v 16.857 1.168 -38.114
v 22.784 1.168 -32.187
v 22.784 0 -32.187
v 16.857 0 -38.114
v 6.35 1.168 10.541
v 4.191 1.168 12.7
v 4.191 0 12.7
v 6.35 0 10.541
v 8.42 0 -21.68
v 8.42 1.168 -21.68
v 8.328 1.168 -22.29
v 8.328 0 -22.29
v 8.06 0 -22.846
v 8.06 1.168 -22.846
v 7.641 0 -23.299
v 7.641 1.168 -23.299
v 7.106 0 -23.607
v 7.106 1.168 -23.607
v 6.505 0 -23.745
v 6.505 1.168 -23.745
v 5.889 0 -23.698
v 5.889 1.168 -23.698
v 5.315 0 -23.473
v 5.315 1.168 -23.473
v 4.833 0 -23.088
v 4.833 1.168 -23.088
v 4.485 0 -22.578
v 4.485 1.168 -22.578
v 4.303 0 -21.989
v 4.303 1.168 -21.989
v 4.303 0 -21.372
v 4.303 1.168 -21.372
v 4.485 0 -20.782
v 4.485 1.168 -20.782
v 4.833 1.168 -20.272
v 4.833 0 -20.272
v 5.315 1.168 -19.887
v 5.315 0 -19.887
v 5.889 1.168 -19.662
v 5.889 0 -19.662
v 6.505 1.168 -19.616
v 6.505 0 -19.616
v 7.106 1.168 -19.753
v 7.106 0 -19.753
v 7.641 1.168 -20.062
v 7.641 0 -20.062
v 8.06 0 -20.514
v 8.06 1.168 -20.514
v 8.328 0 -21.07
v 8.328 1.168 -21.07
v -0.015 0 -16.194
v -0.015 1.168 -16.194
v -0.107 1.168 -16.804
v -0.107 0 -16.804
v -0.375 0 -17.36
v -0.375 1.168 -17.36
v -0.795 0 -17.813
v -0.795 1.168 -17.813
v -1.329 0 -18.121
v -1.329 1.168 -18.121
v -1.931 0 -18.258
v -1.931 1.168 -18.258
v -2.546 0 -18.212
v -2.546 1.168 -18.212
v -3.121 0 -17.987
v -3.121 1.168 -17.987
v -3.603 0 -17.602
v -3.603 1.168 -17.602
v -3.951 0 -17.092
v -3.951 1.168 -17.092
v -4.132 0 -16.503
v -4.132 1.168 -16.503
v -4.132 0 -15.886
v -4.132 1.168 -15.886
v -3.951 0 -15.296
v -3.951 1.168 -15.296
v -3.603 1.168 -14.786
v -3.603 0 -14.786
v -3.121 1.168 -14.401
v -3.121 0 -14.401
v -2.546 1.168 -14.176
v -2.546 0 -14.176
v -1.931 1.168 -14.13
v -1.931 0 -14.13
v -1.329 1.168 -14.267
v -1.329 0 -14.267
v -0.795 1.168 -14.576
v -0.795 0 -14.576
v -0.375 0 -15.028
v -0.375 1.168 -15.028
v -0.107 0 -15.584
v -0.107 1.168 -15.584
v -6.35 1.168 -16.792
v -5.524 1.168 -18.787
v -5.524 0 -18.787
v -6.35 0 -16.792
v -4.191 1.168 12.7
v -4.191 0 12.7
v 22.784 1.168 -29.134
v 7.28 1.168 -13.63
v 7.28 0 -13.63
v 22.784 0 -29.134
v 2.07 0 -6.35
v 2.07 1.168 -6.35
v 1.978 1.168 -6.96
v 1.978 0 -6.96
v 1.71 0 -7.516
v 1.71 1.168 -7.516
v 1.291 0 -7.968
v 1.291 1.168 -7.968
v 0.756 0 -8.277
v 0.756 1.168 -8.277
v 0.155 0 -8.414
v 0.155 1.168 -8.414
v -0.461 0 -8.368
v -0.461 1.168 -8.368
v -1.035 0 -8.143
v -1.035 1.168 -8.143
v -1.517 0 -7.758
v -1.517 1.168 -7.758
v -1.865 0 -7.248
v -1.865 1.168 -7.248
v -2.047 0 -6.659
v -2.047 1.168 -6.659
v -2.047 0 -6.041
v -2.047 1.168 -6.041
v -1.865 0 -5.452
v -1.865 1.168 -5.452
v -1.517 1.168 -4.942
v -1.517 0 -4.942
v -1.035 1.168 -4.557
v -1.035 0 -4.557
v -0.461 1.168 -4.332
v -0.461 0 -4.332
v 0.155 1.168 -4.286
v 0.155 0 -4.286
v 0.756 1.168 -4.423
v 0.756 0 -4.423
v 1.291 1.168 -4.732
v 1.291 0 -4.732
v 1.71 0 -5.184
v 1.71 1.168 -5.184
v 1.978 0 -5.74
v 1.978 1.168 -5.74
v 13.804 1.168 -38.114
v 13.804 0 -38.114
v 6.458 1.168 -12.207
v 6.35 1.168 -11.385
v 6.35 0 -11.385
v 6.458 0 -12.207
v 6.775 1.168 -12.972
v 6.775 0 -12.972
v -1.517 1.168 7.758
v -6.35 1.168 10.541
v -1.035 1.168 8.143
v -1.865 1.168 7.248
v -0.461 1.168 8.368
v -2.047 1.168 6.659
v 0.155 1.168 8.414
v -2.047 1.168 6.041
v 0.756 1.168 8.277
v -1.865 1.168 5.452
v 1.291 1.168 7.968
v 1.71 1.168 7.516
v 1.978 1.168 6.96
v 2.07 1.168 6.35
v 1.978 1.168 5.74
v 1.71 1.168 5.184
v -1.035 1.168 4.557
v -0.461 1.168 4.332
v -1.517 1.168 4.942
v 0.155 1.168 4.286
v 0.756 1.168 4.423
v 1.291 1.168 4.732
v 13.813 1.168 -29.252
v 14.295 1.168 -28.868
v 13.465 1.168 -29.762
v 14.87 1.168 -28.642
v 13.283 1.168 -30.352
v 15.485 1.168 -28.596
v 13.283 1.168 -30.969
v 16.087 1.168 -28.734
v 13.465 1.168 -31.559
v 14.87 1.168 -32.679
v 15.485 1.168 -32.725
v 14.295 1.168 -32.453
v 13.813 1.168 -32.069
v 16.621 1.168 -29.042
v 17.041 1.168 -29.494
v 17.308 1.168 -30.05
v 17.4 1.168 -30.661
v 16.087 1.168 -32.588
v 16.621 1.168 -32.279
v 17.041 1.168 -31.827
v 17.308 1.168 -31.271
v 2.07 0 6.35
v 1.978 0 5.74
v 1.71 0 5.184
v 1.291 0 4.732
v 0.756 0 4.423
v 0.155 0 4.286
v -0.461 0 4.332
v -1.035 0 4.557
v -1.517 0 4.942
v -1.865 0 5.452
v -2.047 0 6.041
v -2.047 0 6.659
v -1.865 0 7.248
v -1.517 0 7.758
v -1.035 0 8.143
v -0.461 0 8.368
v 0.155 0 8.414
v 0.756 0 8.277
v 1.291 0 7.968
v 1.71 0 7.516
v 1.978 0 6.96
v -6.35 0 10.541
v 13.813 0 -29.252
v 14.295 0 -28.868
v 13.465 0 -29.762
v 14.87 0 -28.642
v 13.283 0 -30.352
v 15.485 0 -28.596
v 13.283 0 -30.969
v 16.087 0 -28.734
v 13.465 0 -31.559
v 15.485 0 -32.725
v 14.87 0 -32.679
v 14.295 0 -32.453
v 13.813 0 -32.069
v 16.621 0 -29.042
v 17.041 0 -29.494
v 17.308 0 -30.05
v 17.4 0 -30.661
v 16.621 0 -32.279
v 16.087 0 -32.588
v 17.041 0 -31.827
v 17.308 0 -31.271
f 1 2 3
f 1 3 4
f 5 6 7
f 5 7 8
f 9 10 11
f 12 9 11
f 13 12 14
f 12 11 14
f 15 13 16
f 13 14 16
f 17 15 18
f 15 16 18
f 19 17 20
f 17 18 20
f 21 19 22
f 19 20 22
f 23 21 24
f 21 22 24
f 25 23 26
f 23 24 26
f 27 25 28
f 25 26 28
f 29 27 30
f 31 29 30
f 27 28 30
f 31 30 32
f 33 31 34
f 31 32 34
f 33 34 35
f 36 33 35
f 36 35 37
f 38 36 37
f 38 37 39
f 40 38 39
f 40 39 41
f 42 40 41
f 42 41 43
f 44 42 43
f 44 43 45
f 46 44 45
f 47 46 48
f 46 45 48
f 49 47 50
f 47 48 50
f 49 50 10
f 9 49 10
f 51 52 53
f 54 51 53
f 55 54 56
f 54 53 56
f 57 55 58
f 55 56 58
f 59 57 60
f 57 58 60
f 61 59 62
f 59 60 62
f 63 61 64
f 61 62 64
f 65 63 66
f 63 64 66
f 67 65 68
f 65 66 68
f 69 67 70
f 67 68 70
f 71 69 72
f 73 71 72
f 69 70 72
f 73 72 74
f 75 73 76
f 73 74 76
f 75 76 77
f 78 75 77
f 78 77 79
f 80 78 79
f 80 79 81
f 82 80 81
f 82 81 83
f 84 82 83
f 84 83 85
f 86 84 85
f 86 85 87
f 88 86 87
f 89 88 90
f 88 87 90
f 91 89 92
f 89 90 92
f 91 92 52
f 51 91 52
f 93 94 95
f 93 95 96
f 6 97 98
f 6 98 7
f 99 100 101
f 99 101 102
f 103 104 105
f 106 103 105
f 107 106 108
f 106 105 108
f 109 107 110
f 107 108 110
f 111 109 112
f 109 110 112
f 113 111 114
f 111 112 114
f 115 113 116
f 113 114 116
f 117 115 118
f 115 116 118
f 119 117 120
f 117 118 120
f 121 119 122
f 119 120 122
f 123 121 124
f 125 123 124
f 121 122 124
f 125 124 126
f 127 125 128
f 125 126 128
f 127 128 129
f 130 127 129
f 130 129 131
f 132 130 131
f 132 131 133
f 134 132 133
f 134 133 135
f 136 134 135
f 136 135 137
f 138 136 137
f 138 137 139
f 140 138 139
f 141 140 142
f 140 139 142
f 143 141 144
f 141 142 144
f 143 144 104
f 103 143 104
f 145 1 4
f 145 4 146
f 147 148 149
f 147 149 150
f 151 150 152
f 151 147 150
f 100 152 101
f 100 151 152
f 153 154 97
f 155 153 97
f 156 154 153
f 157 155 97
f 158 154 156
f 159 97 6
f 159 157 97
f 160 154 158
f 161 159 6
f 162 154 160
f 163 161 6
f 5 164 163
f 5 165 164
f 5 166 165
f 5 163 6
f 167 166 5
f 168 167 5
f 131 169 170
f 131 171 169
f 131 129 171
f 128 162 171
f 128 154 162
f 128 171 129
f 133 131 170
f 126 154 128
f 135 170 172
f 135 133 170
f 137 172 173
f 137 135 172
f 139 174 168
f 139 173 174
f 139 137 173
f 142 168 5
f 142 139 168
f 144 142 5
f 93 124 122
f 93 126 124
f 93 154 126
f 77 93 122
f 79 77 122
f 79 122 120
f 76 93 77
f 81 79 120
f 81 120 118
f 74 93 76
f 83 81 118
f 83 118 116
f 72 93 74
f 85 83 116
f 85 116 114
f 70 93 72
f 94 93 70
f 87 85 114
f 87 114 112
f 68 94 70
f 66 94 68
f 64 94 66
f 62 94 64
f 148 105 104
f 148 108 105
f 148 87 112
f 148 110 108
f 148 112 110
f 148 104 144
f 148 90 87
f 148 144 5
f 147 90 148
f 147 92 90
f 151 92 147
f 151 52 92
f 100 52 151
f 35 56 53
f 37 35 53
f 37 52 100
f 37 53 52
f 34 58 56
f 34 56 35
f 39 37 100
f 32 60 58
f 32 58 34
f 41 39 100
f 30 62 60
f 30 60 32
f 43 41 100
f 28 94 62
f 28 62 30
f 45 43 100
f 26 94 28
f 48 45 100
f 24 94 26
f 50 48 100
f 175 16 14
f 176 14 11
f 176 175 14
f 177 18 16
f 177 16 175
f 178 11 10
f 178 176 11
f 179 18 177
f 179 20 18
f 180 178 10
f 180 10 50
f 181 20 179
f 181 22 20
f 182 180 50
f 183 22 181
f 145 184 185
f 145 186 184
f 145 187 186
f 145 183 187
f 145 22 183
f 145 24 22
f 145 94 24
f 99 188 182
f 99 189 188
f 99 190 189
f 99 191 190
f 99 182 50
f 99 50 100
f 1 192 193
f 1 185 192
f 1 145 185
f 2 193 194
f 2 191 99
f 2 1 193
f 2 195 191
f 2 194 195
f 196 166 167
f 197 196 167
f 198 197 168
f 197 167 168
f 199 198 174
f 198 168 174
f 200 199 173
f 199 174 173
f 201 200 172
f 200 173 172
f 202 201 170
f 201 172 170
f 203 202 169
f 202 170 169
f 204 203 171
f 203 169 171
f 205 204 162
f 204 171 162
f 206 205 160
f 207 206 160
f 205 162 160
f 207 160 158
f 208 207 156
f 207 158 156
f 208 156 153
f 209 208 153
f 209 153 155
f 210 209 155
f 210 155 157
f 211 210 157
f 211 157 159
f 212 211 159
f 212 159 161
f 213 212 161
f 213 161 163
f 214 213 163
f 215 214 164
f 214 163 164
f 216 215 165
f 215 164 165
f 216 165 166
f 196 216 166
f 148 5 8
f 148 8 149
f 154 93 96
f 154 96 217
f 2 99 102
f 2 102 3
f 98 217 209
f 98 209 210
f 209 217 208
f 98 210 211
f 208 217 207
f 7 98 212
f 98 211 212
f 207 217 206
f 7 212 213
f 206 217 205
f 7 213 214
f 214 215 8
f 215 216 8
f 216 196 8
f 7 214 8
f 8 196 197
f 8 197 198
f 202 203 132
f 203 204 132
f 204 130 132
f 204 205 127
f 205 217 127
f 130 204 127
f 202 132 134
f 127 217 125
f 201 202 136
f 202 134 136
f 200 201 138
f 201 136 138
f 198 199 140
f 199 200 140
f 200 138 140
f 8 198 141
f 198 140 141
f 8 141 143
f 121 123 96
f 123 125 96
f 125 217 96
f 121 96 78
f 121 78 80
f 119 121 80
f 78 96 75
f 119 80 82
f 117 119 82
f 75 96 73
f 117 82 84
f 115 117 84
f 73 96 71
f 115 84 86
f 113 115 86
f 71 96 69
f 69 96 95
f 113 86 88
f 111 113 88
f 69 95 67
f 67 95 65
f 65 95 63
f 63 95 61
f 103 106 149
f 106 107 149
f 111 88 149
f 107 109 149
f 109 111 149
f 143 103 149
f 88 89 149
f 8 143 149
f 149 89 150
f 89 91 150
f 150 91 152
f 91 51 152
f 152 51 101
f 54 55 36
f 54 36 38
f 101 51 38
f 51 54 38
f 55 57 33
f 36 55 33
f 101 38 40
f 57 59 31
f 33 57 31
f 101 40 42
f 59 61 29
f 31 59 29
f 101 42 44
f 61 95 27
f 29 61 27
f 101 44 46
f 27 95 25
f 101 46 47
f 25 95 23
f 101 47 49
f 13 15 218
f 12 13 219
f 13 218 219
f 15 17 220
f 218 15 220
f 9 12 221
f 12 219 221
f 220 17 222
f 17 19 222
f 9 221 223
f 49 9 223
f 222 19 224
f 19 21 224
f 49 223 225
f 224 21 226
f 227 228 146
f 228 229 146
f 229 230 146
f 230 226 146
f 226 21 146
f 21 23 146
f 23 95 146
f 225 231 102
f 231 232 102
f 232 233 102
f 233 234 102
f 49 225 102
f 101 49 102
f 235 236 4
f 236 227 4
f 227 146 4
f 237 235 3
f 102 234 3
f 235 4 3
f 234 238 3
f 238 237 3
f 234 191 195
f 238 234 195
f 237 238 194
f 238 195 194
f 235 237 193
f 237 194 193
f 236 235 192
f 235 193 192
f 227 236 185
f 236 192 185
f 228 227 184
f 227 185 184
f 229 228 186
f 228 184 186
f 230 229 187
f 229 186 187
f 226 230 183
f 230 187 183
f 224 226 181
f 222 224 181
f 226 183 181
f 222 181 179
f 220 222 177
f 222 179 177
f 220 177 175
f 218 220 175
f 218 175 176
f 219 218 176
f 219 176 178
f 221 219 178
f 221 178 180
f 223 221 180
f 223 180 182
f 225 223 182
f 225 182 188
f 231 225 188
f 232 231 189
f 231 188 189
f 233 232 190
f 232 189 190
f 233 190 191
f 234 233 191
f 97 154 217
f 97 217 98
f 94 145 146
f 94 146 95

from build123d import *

# Parameters (mm, degrees)
SKETCH1_R           = 2.0701
BOSS_EXTRUDE1_DEPTH = 1.1684


with BuildPart() as part:
    # Sketch1 → Boss-Extrude1 (new body)
    with BuildSketch(Plane(origin=(0, 1.1684, 0), x_dir=(1, 0, 0), z_dir=(0, 1, 0))):
        with BuildLine():
            Line((16.856899662, 38.114124823), (13.80361258, 38.114124823))
            Line((13.80361258, 38.114124823), (-5.52378647, 18.786725773))
            Line((-5.52378647, 18.786725773), (-6.35, 16.792069862))
            Line((-6.35, 16.792069862), (-6.35, -10.541))
            Line((-6.35, -10.541), (-4.191, -12.7))
            Line((-4.191, -12.7), (4.191, -12.7))
            Line((4.191, -12.7), (6.35, -10.541))
            Line((6.35, -10.541), (6.35, 11.384871939))
            ThreePointArc((6.35, 11.384871939), (6.591682484, 12.599891837), (7.27993597, 13.62993597))
            Line((7.27993597, 13.62993597), (22.783868702, 29.133868702))
            Line((22.783868702, 29.133868702), (22.783868702, 32.187155783))
            Line((22.783868702, 32.187155783), (16.856899662, 38.114124823))
        make_face()
        with Locations((15.330256121, 30.660512242)):
            Circle(SKETCH1_R, mode=Mode.SUBTRACT)
        with Locations((0, 6.35)):
            Circle(SKETCH1_R, mode=Mode.SUBTRACT)
        with Locations((-2.085466914, 16.194084801)):
            Circle(SKETCH1_R, mode=Mode.SUBTRACT)
        with Locations((0, -6.35)):
            Circle(SKETCH1_R, mode=Mode.SUBTRACT)
        with Locations((6.35, 21.680256121)):
            Circle(SKETCH1_R, mode=Mode.SUBTRACT)
    extrude(amount=-BOSS_EXTRUDE1_DEPTH)


solid = part.part
